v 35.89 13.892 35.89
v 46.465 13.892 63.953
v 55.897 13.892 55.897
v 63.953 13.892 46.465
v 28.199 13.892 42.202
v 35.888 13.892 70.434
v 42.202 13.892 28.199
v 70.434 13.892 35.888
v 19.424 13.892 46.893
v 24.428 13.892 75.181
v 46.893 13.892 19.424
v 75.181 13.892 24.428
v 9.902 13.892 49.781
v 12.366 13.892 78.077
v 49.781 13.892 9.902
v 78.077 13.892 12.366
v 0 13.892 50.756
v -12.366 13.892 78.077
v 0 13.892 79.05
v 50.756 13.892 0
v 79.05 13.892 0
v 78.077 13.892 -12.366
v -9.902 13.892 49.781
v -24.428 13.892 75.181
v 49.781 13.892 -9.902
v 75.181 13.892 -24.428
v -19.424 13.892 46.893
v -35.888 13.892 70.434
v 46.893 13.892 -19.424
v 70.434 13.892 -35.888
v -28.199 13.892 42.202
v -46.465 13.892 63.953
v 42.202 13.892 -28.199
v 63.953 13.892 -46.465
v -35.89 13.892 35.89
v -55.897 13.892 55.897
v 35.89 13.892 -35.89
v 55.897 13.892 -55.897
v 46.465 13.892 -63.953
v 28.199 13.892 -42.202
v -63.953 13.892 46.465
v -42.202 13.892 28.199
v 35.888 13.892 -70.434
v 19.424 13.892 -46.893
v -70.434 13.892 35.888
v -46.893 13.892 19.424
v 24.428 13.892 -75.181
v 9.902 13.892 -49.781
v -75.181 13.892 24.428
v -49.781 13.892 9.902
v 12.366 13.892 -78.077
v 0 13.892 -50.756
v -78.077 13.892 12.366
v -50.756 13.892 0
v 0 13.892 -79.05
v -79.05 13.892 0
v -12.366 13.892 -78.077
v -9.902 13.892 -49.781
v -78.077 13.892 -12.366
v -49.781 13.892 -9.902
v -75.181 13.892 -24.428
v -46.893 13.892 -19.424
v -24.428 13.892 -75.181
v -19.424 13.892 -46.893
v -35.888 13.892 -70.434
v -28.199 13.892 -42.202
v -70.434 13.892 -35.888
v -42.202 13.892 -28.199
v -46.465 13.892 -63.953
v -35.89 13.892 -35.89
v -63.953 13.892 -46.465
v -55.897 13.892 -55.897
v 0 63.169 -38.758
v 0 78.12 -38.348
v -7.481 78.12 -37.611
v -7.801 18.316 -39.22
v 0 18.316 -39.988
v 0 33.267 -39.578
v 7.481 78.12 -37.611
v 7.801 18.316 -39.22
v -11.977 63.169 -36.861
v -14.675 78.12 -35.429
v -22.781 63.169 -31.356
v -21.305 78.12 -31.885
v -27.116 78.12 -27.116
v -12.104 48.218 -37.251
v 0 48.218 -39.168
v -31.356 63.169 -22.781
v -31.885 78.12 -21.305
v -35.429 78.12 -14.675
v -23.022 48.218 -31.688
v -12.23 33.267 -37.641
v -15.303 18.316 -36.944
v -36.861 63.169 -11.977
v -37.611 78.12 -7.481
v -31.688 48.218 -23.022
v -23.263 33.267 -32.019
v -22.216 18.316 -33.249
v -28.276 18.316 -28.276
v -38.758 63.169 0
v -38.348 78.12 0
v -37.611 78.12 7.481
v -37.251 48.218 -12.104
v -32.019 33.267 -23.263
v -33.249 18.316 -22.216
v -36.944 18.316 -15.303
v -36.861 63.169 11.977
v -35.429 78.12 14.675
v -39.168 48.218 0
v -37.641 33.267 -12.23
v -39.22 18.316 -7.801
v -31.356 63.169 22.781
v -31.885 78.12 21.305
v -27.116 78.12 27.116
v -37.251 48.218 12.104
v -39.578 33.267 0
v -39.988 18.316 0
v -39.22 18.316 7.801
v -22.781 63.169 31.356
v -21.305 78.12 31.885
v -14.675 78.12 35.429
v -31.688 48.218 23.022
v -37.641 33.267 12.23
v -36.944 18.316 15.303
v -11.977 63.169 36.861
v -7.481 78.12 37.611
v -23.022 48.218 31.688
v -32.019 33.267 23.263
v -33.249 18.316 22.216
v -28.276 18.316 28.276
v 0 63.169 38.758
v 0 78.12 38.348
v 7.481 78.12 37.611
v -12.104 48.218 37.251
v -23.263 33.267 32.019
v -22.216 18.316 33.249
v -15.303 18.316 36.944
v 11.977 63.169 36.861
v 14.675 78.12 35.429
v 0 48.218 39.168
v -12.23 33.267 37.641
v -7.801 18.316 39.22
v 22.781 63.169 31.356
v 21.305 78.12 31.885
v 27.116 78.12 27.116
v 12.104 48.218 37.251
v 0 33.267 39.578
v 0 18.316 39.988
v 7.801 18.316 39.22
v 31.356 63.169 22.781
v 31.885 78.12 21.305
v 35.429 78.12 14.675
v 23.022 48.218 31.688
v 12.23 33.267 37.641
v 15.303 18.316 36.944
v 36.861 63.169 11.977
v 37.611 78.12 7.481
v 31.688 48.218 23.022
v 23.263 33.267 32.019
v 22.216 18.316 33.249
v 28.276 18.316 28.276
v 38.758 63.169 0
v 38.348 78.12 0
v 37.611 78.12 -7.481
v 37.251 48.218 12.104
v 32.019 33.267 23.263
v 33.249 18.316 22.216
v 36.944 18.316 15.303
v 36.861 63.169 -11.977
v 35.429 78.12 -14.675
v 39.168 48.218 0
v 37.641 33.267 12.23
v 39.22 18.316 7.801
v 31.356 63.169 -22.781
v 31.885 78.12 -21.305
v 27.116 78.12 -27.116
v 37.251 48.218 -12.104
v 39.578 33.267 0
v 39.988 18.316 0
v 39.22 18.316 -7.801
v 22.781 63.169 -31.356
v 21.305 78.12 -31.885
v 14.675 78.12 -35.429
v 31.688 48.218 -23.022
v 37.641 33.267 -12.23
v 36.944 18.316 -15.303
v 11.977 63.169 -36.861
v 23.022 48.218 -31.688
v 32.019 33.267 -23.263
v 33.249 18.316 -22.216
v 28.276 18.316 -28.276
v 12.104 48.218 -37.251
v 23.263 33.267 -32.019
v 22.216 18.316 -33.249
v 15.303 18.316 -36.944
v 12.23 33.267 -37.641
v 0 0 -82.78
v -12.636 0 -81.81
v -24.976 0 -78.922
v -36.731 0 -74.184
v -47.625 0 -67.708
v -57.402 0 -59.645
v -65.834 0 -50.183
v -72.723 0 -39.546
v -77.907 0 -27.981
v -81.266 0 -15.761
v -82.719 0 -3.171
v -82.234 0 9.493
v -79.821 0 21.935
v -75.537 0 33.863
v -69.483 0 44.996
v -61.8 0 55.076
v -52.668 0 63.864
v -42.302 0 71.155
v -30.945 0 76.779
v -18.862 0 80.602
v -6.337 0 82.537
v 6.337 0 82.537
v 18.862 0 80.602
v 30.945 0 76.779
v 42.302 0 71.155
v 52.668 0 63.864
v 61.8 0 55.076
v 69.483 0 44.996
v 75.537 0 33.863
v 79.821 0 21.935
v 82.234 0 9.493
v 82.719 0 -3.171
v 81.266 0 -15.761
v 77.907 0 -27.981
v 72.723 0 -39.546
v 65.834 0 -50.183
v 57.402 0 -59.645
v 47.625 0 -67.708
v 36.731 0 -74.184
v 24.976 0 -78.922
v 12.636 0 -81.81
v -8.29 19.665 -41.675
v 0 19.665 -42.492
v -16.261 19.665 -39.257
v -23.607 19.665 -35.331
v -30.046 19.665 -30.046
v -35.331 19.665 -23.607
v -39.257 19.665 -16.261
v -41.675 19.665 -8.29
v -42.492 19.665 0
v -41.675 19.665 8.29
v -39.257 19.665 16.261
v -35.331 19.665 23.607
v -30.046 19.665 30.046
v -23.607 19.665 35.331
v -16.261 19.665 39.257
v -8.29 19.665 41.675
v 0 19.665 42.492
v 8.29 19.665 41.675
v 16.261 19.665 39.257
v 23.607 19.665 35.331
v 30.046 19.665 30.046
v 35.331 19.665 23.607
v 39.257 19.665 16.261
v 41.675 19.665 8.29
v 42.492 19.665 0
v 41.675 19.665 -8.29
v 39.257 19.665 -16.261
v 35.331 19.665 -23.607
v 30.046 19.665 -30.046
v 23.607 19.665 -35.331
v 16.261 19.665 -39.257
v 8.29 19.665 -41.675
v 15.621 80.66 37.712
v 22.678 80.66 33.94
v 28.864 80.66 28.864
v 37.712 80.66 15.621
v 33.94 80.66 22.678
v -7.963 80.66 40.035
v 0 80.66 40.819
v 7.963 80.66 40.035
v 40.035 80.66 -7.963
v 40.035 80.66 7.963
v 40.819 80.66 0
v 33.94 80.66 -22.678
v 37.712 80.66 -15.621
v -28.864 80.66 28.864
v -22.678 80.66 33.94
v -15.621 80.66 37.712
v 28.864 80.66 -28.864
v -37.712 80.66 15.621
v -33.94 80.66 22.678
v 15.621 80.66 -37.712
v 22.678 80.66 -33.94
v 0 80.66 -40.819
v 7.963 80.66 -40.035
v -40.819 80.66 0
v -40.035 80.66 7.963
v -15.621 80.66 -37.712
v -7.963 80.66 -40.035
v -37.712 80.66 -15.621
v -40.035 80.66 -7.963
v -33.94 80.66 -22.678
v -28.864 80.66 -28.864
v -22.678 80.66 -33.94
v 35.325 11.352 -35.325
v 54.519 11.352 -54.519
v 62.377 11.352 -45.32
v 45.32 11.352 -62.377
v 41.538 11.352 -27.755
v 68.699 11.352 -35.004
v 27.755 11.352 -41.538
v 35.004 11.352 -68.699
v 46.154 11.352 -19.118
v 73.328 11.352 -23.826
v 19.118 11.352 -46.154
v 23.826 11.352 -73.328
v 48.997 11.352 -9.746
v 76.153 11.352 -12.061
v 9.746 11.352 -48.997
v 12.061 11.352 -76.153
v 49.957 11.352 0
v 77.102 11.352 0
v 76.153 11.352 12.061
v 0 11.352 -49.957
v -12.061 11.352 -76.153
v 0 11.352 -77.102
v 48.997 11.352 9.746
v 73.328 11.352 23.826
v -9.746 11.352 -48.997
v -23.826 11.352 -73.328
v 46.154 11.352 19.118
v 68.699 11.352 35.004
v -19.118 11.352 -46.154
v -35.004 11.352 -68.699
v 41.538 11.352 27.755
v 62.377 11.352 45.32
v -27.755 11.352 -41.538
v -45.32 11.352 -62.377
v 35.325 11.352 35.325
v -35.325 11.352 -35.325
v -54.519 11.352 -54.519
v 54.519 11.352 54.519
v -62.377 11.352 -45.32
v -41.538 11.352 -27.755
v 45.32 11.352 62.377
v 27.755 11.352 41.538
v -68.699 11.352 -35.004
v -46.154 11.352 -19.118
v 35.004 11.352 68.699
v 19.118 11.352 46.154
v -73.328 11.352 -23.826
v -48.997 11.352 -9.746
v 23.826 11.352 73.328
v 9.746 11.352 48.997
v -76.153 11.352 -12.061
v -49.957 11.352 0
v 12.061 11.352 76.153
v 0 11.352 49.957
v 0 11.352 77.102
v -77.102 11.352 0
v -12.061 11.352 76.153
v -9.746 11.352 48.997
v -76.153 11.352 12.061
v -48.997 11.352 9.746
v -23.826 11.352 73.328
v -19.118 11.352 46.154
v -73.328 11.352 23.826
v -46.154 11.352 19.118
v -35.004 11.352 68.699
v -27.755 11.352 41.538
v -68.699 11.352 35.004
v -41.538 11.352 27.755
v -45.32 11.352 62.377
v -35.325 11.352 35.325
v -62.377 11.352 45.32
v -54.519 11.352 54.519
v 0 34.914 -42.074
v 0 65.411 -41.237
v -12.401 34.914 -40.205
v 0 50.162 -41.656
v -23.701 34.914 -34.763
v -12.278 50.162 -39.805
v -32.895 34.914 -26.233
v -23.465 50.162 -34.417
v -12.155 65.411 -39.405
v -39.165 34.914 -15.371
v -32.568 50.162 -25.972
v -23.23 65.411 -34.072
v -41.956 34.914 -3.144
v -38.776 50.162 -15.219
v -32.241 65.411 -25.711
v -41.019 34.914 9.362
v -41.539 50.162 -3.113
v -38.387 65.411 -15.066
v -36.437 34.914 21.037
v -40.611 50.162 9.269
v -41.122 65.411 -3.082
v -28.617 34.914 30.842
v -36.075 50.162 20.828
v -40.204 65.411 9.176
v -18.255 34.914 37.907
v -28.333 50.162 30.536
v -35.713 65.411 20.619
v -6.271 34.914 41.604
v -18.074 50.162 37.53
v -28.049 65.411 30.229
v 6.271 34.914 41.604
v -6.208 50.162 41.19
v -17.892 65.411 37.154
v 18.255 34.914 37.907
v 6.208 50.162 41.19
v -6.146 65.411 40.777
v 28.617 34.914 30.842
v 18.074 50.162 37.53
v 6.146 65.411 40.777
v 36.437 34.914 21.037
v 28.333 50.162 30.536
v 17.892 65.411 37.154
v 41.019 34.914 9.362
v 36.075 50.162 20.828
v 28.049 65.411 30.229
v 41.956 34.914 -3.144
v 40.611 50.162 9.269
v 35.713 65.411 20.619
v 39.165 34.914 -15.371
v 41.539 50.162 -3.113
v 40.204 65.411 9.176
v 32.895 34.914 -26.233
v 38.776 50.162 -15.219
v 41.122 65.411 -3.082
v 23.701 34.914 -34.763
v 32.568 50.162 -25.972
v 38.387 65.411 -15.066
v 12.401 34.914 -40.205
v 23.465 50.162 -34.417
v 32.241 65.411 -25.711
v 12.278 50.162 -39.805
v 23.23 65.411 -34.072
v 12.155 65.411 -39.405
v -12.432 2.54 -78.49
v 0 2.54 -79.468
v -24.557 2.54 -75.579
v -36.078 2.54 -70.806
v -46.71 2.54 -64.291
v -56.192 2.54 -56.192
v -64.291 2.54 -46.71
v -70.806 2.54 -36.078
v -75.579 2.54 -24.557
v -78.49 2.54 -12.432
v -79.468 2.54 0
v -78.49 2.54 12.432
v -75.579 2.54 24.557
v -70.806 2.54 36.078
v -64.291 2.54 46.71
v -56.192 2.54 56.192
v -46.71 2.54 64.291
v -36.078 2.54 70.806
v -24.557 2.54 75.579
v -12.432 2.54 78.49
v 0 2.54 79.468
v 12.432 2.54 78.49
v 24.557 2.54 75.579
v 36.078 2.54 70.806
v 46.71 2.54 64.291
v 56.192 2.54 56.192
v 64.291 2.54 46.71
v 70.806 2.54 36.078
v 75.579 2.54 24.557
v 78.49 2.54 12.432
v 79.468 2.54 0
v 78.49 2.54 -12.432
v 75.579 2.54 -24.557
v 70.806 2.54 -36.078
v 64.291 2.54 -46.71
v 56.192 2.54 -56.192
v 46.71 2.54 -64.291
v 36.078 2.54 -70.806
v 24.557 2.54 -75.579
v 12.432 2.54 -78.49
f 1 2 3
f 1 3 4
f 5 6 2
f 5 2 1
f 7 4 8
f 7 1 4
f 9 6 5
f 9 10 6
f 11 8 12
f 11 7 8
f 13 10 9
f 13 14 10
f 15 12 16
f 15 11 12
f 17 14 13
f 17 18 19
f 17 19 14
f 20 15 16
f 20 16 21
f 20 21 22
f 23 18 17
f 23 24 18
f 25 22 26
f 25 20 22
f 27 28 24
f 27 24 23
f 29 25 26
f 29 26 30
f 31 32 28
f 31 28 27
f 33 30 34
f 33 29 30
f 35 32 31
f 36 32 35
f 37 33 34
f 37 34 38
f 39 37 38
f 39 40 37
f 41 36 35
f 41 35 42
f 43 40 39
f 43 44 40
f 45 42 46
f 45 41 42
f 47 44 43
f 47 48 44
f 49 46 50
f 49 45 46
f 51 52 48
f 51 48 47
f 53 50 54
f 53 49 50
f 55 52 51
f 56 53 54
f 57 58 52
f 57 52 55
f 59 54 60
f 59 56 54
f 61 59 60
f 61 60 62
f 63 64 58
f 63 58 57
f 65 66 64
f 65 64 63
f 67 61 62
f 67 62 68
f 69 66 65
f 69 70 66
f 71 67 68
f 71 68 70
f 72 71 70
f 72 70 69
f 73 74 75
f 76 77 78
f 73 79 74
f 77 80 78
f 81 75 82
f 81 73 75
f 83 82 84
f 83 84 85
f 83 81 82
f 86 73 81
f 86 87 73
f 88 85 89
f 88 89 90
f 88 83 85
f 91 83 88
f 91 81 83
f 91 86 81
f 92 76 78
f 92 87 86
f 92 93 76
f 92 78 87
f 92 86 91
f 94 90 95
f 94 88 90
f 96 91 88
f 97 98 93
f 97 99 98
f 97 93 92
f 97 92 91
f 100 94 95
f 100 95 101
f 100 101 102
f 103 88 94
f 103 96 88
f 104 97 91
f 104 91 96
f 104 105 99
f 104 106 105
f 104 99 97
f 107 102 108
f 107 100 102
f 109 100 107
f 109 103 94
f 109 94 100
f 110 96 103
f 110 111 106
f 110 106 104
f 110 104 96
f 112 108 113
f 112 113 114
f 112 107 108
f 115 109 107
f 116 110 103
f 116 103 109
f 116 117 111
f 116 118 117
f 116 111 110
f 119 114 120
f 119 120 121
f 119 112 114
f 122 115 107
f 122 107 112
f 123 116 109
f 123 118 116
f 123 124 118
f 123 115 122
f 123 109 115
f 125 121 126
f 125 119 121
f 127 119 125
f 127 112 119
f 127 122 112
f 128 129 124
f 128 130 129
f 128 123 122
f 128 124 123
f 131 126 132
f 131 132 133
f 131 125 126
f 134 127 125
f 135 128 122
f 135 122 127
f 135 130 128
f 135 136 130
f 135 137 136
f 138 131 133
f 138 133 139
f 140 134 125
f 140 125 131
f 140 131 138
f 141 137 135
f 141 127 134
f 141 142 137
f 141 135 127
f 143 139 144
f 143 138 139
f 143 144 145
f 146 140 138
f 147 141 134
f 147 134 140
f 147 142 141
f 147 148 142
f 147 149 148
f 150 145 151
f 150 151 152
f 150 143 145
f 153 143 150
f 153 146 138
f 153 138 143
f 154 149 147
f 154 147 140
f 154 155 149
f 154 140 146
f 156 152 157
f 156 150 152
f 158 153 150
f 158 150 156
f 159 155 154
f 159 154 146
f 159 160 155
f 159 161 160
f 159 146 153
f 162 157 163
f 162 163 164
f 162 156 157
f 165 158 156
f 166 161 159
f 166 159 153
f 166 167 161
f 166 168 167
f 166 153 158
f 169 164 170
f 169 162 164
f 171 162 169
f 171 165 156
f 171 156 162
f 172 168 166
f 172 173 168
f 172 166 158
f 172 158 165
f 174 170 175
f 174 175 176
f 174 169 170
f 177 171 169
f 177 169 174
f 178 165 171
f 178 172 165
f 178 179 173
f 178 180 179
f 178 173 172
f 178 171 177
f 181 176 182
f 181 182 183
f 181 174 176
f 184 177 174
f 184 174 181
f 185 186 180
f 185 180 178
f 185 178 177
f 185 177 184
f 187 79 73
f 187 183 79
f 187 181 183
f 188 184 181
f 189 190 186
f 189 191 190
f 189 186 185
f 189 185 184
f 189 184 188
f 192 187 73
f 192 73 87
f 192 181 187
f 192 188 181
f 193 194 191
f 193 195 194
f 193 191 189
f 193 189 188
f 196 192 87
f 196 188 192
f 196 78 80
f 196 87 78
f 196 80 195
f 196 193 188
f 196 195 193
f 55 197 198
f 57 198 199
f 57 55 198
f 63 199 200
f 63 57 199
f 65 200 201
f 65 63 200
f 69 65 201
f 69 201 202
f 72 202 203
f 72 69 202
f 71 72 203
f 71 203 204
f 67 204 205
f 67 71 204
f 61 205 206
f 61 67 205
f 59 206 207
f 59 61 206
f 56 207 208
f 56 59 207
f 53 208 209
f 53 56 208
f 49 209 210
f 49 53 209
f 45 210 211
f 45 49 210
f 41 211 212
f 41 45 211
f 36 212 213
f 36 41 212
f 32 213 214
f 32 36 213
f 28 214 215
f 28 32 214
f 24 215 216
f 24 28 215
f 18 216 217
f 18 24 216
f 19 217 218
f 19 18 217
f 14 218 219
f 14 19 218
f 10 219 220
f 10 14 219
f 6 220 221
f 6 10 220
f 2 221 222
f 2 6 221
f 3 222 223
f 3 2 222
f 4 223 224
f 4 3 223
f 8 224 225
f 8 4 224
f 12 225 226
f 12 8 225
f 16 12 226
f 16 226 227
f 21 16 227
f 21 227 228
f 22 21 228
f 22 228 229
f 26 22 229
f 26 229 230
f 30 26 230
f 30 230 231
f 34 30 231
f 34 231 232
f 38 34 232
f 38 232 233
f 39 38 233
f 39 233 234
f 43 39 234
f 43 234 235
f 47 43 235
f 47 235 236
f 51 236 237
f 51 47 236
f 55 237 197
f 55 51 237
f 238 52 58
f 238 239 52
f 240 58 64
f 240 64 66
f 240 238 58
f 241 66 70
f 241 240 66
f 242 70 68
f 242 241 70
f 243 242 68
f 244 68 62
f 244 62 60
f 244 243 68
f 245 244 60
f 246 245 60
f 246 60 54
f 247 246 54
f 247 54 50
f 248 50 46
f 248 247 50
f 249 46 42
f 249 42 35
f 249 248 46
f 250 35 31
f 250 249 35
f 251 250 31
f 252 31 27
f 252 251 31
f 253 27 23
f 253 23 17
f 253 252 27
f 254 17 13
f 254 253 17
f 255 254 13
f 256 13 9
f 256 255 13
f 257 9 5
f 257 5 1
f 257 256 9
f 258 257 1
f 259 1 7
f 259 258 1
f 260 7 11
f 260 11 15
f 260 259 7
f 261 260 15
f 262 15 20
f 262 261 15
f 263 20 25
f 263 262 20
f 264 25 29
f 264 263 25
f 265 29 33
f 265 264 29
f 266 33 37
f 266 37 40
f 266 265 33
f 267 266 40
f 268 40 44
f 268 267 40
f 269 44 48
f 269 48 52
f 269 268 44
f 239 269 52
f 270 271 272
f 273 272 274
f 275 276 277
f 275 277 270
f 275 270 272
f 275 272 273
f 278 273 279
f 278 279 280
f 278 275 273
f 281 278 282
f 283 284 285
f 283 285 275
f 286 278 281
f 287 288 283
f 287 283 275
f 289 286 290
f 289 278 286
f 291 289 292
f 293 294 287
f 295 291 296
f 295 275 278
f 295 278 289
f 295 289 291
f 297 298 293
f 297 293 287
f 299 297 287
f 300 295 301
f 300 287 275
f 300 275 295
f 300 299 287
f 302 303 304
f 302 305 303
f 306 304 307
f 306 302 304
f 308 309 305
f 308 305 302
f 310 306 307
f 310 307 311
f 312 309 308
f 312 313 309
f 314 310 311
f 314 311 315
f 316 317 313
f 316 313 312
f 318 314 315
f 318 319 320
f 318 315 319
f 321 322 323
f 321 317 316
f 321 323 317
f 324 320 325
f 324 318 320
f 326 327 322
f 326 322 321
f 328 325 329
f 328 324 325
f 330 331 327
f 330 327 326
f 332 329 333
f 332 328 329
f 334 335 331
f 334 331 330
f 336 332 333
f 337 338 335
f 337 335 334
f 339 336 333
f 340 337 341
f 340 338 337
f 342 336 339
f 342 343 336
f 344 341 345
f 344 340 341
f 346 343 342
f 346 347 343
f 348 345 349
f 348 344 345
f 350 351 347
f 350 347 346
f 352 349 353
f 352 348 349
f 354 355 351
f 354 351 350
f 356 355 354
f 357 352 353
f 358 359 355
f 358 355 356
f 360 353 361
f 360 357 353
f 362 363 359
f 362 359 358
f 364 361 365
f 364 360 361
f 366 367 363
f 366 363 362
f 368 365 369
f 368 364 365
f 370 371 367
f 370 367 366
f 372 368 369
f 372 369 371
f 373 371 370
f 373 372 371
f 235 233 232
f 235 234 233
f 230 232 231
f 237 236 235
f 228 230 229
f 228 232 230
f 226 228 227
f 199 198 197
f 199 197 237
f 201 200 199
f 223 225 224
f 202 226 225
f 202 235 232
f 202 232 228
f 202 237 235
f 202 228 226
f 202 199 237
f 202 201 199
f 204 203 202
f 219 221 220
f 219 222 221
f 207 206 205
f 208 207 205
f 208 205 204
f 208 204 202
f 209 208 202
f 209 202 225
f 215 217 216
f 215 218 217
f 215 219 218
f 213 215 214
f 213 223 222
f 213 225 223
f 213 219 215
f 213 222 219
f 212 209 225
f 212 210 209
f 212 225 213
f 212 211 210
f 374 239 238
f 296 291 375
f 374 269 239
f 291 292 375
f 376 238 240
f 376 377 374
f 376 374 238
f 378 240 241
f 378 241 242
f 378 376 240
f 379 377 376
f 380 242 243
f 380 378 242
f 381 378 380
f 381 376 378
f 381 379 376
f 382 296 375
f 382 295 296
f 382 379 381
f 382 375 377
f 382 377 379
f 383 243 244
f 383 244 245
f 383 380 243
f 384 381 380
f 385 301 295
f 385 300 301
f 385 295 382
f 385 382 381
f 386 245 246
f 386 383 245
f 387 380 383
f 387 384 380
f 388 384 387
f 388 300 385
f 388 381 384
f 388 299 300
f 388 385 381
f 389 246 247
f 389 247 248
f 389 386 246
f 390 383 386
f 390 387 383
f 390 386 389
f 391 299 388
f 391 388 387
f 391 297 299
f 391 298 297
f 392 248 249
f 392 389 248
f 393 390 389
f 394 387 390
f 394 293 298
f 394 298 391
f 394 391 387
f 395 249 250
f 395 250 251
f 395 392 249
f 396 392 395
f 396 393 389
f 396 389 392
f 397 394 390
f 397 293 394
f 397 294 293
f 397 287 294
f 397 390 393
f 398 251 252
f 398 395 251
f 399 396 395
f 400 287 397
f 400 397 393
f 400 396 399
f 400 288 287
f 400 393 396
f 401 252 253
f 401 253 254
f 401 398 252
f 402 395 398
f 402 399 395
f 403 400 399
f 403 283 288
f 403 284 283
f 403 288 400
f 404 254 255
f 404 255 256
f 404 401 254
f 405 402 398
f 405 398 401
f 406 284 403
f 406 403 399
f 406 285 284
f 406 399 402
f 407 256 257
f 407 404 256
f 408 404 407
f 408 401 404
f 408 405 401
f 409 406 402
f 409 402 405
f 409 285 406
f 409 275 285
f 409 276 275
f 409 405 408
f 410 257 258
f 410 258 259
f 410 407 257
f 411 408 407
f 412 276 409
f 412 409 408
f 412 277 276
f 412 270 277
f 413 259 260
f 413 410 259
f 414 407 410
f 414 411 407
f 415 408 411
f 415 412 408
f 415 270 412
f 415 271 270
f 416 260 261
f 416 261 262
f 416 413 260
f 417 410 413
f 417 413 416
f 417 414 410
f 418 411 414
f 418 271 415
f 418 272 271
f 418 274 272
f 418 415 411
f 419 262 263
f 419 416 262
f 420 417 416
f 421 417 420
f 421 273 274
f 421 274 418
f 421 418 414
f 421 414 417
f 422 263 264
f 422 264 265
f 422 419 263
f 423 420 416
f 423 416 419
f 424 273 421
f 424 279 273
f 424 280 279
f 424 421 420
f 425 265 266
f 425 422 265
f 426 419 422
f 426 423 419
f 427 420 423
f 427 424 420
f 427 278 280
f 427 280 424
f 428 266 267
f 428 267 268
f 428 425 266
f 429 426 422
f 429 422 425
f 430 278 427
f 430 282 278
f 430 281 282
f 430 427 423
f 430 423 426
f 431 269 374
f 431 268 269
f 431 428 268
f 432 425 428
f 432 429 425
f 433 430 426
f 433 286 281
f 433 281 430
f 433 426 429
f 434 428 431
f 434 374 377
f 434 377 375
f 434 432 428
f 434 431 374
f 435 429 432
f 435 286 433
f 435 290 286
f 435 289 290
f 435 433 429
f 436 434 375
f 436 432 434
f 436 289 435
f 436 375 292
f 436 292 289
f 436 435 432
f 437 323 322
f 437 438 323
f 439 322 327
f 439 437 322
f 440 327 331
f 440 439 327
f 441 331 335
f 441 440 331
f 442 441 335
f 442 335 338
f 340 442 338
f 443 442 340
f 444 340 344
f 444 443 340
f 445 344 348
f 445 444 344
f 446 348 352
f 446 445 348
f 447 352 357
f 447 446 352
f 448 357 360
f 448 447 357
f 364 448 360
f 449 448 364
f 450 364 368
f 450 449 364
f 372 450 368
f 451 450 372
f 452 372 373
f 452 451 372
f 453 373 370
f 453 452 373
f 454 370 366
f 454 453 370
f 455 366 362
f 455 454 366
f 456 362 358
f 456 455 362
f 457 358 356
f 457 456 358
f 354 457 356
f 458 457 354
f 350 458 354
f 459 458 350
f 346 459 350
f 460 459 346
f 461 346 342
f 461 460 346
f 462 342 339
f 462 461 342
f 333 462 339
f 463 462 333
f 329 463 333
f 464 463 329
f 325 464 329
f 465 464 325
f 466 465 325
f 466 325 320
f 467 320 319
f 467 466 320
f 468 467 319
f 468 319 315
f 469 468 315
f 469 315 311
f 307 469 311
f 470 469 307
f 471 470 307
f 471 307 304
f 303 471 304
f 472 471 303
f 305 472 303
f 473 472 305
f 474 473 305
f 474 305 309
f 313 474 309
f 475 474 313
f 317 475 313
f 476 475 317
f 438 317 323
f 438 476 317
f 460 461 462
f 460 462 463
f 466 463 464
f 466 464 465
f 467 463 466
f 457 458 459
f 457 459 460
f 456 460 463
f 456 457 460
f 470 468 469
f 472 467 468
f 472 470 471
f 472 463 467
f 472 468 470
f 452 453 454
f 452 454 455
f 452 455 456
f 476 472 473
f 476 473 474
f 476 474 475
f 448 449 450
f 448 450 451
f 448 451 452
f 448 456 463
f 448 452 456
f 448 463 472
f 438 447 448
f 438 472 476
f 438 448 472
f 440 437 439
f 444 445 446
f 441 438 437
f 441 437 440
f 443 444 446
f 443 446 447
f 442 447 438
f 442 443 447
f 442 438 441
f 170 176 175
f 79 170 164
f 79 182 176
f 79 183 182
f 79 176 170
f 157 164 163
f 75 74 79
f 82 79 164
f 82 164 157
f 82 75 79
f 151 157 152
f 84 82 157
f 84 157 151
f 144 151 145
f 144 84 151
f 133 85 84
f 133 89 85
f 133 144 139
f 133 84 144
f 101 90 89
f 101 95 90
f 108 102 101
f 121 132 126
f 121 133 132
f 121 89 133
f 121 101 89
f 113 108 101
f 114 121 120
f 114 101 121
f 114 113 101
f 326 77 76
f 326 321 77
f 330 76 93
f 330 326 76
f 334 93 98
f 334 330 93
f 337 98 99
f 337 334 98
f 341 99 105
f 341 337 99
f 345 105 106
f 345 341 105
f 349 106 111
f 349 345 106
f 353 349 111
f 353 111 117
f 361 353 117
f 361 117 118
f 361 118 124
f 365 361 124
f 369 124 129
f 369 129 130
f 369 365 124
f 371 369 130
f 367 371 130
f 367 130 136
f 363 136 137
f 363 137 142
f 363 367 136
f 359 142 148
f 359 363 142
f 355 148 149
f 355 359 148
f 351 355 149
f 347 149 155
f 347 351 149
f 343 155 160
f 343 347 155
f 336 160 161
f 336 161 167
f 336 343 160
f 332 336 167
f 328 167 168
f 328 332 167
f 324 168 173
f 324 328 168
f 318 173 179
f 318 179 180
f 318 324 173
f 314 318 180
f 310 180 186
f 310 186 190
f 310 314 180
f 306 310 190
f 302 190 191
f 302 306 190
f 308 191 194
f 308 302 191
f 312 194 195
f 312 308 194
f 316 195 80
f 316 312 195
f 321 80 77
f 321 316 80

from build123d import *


with BuildPart() as part:
    # Sketch1 → Revolve-Thin1 (revolve)
    with BuildSketch(Plane(origin=(0, 0, 0), x_dir=(0, 0, -1), z_dir=(1, 0, 0)), mode=Mode.PRIVATE) as revolve_thin1_sk:
        Polygon((0, 0), (-82.77987, 0), (-79.050134, 13.891514), (-50.756312, 13.891514), (-42.491914, 19.664934), (-40.819324, 80.659732), (0, 80.659732), (0, 78.119732), (-38.348020684, 78.119732), (-39.987956021, 18.315760551), (-49.9569701, 11.351514), (-77.102141701, 11.351514), (-79.467947256, 2.54), (0, 2.54), align=None)
    revolve(revolve_thin1_sk.sketch.rotate(Axis((0, 0, 0), (0, 1, 0)), 180), axis=Axis((0, 0, 0), (0, 1, 0)))


solid = part.part
